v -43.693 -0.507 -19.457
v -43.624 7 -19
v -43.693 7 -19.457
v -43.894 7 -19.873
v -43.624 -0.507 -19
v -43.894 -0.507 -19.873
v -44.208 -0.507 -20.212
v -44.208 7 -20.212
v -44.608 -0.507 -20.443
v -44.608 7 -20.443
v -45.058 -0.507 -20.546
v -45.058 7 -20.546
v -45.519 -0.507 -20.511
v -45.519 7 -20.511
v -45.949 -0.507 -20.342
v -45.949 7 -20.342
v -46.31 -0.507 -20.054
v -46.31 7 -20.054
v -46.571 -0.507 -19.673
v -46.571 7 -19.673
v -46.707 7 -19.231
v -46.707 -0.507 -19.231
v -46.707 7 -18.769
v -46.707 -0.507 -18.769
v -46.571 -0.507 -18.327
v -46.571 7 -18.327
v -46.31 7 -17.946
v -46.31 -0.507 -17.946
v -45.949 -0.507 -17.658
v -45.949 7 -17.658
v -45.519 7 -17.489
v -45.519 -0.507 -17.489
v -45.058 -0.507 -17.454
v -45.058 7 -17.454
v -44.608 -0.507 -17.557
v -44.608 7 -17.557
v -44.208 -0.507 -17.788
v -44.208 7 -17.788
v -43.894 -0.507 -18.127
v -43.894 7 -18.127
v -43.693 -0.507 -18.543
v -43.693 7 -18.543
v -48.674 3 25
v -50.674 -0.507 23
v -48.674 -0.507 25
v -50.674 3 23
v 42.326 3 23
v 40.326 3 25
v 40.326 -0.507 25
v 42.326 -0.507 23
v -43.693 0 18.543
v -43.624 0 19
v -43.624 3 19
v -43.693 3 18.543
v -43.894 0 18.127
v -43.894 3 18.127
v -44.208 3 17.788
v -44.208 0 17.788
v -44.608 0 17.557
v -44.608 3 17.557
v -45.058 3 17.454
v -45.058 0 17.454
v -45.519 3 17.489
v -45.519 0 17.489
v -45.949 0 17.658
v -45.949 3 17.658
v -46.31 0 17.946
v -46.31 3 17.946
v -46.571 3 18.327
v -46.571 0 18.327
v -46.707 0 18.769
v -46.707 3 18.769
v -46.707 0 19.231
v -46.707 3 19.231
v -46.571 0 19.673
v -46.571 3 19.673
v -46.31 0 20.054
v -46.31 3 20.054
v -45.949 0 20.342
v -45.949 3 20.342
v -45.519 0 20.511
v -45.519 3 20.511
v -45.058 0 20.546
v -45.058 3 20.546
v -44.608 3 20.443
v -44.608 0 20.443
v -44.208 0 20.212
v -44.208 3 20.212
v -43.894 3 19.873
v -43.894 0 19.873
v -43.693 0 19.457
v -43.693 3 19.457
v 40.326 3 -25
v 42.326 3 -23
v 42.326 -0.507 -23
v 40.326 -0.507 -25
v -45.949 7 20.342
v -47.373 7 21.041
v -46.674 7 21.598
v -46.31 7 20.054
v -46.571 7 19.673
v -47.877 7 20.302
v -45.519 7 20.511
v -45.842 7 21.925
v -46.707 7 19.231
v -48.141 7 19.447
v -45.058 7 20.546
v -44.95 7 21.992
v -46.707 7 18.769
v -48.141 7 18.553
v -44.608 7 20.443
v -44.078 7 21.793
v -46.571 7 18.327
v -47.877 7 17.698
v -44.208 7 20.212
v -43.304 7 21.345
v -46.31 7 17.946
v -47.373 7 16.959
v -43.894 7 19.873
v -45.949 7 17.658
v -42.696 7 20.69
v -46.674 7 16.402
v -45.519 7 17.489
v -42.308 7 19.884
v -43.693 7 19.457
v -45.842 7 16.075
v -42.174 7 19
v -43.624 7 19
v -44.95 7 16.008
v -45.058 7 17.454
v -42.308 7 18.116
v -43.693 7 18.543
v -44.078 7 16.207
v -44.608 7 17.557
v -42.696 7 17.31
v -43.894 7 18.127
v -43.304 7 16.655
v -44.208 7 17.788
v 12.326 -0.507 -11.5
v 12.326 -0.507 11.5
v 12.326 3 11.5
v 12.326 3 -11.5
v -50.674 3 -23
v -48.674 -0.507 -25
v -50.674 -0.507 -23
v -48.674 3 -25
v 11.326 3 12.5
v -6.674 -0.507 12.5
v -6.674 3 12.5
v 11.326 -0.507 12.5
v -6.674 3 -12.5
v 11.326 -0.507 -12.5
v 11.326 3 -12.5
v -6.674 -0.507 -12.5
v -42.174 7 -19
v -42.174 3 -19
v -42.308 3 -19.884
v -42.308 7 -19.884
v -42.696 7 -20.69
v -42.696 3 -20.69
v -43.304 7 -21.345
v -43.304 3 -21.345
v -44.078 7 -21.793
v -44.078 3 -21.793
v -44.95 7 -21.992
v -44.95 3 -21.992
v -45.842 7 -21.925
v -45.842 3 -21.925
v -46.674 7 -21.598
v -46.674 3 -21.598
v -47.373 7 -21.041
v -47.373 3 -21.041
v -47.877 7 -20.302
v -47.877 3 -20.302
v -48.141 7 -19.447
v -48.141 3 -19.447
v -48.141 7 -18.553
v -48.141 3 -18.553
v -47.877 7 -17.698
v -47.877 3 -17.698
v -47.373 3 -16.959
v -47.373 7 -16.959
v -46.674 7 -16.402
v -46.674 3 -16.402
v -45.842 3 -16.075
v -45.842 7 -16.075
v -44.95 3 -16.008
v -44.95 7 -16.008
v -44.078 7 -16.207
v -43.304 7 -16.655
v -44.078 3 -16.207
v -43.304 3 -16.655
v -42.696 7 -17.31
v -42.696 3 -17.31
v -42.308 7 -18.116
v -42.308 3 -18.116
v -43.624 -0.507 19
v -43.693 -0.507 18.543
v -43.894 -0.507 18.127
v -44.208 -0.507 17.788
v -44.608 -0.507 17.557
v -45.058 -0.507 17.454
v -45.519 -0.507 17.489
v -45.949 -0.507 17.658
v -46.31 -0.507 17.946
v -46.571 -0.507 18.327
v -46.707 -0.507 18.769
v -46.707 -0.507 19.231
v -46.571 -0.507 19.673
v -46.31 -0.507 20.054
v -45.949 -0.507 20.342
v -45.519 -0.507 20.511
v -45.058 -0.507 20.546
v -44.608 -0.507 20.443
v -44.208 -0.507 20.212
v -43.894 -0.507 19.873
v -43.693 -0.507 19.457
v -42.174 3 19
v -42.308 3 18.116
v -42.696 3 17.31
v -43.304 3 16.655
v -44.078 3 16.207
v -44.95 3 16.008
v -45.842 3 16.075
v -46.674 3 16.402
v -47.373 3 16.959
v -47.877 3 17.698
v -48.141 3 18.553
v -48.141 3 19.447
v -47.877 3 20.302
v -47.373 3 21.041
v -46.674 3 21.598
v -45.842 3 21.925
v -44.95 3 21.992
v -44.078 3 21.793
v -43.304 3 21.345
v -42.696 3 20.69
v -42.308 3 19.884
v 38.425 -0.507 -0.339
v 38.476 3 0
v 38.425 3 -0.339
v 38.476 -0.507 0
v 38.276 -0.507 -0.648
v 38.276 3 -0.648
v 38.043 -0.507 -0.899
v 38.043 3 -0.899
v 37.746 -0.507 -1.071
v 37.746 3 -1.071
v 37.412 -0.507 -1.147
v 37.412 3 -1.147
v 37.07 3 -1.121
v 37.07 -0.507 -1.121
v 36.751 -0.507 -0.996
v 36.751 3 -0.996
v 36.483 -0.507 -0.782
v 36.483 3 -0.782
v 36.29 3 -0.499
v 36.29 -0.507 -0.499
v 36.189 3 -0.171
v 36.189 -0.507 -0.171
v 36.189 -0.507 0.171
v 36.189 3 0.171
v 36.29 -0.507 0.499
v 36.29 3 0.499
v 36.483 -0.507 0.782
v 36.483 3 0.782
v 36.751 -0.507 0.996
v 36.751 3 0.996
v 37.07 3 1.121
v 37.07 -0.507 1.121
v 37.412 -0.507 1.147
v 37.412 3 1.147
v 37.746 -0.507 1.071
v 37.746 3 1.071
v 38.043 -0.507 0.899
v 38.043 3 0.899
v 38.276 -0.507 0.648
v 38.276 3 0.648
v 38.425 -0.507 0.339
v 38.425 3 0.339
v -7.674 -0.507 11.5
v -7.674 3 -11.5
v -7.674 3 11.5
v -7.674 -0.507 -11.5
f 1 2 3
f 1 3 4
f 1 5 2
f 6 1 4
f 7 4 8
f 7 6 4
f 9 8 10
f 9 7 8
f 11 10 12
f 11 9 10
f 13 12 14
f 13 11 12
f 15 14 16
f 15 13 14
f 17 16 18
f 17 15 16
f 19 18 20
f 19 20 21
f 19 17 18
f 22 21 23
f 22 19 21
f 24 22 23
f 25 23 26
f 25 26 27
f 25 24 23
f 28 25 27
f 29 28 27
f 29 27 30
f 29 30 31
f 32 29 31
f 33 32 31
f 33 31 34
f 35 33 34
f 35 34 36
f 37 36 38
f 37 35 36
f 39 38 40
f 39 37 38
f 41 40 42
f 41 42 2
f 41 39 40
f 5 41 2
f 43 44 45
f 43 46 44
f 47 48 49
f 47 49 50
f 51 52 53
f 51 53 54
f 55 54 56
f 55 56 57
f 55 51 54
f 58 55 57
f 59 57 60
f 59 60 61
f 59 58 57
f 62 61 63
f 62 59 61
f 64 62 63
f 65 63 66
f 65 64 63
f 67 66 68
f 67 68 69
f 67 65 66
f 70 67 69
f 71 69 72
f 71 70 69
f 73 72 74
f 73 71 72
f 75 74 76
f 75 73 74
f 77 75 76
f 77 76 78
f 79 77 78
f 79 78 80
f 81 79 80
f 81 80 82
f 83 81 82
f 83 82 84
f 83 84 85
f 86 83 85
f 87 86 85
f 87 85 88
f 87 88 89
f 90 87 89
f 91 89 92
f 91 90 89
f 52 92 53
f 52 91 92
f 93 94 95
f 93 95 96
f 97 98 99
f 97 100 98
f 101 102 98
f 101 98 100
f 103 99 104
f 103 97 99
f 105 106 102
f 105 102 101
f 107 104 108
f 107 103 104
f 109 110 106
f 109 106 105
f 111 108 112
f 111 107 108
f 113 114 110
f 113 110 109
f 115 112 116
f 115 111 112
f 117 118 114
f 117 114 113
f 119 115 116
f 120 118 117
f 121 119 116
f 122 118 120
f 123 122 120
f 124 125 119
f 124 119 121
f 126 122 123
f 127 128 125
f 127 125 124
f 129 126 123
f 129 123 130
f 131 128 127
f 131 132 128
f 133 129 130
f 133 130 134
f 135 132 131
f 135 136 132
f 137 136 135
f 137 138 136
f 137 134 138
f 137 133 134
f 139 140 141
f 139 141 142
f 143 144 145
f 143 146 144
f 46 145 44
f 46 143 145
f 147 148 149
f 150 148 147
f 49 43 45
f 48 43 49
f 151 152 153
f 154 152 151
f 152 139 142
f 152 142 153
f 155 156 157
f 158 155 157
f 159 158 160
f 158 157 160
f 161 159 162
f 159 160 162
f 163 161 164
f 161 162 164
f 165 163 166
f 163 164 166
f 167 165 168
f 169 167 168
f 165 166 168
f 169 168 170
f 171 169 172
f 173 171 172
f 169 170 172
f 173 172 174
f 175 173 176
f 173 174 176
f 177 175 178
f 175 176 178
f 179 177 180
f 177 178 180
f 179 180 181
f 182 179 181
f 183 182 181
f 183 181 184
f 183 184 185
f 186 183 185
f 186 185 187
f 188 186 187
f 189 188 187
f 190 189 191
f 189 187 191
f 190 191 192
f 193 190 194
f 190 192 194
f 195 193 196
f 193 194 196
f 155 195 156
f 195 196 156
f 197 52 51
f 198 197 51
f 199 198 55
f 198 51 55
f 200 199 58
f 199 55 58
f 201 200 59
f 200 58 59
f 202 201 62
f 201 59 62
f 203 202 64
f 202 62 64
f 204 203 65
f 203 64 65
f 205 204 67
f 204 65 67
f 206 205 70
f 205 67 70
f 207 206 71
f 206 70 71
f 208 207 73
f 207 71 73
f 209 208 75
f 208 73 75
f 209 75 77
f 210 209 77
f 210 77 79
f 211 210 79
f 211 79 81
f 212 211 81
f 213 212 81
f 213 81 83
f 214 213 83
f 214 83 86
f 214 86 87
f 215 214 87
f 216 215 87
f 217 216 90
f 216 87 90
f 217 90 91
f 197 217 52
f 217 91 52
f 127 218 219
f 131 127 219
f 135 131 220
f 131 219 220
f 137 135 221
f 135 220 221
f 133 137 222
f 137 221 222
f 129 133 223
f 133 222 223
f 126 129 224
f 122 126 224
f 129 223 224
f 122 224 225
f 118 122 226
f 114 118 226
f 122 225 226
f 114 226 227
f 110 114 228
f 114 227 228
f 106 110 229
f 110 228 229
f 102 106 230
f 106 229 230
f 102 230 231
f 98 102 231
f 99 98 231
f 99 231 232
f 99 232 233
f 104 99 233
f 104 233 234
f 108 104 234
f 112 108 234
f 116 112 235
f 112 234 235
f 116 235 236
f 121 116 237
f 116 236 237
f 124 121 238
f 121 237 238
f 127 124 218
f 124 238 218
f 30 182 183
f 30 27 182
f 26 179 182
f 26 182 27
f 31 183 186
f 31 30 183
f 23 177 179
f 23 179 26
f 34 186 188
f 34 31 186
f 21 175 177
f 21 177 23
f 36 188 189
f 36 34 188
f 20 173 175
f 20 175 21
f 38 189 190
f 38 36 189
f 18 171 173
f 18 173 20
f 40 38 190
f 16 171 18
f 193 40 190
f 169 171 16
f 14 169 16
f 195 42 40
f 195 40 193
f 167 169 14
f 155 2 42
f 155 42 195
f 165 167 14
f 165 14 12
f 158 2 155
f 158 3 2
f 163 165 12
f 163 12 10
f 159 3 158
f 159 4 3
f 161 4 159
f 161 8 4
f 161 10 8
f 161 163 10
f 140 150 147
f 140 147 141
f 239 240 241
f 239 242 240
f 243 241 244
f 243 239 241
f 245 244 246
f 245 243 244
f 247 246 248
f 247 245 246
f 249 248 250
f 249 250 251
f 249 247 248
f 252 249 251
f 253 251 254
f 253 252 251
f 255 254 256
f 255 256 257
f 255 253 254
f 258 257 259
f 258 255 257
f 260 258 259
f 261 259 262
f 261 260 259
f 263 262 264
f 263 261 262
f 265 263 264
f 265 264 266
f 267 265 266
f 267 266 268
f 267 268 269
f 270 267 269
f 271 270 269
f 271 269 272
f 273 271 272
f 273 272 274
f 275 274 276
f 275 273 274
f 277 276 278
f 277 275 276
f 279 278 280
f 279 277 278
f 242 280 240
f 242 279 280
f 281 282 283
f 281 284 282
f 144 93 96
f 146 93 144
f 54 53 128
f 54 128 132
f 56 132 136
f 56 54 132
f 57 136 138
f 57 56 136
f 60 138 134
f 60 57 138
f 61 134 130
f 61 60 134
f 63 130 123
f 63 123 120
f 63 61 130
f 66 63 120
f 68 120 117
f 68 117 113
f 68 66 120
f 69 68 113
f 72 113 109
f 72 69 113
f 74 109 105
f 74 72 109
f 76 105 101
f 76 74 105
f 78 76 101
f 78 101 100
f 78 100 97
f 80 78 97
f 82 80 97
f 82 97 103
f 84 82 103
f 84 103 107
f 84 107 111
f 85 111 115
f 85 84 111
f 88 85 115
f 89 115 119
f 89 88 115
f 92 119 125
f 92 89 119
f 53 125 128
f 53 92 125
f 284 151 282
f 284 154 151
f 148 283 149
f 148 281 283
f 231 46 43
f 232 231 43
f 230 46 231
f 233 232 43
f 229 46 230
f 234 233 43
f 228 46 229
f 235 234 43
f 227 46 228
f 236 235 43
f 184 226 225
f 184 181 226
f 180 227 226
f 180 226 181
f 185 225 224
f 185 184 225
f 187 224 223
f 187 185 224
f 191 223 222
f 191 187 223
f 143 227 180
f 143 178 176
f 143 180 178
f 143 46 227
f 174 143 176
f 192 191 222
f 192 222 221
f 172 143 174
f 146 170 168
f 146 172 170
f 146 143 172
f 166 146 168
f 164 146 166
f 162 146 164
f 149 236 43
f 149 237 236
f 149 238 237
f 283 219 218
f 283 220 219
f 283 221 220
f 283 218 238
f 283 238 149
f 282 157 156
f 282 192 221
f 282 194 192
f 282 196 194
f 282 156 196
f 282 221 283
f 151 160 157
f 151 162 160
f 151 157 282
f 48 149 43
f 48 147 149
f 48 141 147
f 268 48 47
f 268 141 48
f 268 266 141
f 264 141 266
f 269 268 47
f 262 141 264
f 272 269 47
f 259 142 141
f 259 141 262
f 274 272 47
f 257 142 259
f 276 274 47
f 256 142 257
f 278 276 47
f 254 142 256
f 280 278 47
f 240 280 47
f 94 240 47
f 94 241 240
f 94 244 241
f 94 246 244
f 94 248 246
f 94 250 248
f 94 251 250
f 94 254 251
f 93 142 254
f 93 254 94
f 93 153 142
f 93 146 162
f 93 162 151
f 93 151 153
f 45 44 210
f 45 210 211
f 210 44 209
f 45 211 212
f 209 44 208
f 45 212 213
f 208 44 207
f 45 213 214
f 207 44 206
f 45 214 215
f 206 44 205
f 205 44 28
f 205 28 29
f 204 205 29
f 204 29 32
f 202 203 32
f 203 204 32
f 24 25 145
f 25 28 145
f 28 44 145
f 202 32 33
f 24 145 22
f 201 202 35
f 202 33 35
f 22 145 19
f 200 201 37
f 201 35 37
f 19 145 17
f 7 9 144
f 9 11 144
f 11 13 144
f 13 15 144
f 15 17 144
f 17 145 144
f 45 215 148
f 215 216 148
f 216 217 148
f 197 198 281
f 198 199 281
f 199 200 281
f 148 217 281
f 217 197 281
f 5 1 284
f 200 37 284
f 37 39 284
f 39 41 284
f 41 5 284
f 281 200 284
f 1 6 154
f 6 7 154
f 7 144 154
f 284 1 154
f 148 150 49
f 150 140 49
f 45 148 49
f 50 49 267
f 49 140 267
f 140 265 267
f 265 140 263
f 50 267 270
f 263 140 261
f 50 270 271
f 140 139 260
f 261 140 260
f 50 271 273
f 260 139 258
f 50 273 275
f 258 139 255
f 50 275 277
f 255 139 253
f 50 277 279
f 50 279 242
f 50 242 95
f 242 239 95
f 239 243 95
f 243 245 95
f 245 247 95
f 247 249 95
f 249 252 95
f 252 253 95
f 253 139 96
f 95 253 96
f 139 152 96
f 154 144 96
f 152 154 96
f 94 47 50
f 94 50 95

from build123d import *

# Parameters (mm, degrees)
SKETCH1_R                = 1.15
SKETCH1_R_2              = 1.55
BOSS_EXTRUDE1_DEPTH      = 3
BOSS_EXTRUDE1_DEPTH_BACK = 0.506598952
SKETCH2_R                = 3
SKETCH2_R_2              = 1.55
BOSS_EXTRUDE2_DEPTH      = 4


with BuildPart() as part:
    # Sketch1 → Boss-Extrude1 (new body, two sides)
    with BuildSketch(Plane(origin=(0, 0, 0), x_dir=(1, 0, 0), z_dir=(0, 1, 0))) as boss_extrude1_sk:
        Polygon((-48.674262421, -25), (40.325737579, -25), (42.325737579, -23), (42.325737579, 23), (40.325737579, 25), (-48.674262421, 25), (-50.674262421, 23), (-50.674262421, -23), align=None)
        with Locations((37.325737579, 0)):
            Circle(SKETCH1_R, mode=Mode.SUBTRACT)
        with Locations((-45.174262421, 19)):
            Circle(SKETCH1_R_2, mode=Mode.SUBTRACT)
        with Locations((-45.174262421, -19)):
            Circle(SKETCH1_R_2, mode=Mode.SUBTRACT)
        Polygon((-6.674262421, -12.5), (11.325737579, -12.5), (12.325737579, -11.5), (12.325737579, 11.5), (11.325737579, 12.5), (-6.674262421, 12.5), (-7.674262421, 11.5), (-7.674262421, -11.5), align=None, mode=Mode.SUBTRACT)
    extrude(amount=BOSS_EXTRUDE1_DEPTH)
    extrude(boss_extrude1_sk.sketch, amount=-BOSS_EXTRUDE1_DEPTH_BACK)

    # Sketch2 → Boss-Extrude2 (add)
    with BuildSketch(Plane(origin=(0, 3, 0), x_dir=(1, 0, 0), z_dir=(0, 1, 0))):
        with Locations((-45.174262421, 19)):
            Circle(SKETCH2_R)
        with Locations((-45.174262421, 19)):
            Circle(SKETCH2_R_2, mode=Mode.SUBTRACT)
        with Locations((-45.174262421, -19)):
            Circle(SKETCH2_R)
        with Locations((-45.174262421, -19)):
            Circle(SKETCH2_R_2, mode=Mode.SUBTRACT)
    extrude(amount=BOSS_EXTRUDE2_DEPTH)


solid = part.part
